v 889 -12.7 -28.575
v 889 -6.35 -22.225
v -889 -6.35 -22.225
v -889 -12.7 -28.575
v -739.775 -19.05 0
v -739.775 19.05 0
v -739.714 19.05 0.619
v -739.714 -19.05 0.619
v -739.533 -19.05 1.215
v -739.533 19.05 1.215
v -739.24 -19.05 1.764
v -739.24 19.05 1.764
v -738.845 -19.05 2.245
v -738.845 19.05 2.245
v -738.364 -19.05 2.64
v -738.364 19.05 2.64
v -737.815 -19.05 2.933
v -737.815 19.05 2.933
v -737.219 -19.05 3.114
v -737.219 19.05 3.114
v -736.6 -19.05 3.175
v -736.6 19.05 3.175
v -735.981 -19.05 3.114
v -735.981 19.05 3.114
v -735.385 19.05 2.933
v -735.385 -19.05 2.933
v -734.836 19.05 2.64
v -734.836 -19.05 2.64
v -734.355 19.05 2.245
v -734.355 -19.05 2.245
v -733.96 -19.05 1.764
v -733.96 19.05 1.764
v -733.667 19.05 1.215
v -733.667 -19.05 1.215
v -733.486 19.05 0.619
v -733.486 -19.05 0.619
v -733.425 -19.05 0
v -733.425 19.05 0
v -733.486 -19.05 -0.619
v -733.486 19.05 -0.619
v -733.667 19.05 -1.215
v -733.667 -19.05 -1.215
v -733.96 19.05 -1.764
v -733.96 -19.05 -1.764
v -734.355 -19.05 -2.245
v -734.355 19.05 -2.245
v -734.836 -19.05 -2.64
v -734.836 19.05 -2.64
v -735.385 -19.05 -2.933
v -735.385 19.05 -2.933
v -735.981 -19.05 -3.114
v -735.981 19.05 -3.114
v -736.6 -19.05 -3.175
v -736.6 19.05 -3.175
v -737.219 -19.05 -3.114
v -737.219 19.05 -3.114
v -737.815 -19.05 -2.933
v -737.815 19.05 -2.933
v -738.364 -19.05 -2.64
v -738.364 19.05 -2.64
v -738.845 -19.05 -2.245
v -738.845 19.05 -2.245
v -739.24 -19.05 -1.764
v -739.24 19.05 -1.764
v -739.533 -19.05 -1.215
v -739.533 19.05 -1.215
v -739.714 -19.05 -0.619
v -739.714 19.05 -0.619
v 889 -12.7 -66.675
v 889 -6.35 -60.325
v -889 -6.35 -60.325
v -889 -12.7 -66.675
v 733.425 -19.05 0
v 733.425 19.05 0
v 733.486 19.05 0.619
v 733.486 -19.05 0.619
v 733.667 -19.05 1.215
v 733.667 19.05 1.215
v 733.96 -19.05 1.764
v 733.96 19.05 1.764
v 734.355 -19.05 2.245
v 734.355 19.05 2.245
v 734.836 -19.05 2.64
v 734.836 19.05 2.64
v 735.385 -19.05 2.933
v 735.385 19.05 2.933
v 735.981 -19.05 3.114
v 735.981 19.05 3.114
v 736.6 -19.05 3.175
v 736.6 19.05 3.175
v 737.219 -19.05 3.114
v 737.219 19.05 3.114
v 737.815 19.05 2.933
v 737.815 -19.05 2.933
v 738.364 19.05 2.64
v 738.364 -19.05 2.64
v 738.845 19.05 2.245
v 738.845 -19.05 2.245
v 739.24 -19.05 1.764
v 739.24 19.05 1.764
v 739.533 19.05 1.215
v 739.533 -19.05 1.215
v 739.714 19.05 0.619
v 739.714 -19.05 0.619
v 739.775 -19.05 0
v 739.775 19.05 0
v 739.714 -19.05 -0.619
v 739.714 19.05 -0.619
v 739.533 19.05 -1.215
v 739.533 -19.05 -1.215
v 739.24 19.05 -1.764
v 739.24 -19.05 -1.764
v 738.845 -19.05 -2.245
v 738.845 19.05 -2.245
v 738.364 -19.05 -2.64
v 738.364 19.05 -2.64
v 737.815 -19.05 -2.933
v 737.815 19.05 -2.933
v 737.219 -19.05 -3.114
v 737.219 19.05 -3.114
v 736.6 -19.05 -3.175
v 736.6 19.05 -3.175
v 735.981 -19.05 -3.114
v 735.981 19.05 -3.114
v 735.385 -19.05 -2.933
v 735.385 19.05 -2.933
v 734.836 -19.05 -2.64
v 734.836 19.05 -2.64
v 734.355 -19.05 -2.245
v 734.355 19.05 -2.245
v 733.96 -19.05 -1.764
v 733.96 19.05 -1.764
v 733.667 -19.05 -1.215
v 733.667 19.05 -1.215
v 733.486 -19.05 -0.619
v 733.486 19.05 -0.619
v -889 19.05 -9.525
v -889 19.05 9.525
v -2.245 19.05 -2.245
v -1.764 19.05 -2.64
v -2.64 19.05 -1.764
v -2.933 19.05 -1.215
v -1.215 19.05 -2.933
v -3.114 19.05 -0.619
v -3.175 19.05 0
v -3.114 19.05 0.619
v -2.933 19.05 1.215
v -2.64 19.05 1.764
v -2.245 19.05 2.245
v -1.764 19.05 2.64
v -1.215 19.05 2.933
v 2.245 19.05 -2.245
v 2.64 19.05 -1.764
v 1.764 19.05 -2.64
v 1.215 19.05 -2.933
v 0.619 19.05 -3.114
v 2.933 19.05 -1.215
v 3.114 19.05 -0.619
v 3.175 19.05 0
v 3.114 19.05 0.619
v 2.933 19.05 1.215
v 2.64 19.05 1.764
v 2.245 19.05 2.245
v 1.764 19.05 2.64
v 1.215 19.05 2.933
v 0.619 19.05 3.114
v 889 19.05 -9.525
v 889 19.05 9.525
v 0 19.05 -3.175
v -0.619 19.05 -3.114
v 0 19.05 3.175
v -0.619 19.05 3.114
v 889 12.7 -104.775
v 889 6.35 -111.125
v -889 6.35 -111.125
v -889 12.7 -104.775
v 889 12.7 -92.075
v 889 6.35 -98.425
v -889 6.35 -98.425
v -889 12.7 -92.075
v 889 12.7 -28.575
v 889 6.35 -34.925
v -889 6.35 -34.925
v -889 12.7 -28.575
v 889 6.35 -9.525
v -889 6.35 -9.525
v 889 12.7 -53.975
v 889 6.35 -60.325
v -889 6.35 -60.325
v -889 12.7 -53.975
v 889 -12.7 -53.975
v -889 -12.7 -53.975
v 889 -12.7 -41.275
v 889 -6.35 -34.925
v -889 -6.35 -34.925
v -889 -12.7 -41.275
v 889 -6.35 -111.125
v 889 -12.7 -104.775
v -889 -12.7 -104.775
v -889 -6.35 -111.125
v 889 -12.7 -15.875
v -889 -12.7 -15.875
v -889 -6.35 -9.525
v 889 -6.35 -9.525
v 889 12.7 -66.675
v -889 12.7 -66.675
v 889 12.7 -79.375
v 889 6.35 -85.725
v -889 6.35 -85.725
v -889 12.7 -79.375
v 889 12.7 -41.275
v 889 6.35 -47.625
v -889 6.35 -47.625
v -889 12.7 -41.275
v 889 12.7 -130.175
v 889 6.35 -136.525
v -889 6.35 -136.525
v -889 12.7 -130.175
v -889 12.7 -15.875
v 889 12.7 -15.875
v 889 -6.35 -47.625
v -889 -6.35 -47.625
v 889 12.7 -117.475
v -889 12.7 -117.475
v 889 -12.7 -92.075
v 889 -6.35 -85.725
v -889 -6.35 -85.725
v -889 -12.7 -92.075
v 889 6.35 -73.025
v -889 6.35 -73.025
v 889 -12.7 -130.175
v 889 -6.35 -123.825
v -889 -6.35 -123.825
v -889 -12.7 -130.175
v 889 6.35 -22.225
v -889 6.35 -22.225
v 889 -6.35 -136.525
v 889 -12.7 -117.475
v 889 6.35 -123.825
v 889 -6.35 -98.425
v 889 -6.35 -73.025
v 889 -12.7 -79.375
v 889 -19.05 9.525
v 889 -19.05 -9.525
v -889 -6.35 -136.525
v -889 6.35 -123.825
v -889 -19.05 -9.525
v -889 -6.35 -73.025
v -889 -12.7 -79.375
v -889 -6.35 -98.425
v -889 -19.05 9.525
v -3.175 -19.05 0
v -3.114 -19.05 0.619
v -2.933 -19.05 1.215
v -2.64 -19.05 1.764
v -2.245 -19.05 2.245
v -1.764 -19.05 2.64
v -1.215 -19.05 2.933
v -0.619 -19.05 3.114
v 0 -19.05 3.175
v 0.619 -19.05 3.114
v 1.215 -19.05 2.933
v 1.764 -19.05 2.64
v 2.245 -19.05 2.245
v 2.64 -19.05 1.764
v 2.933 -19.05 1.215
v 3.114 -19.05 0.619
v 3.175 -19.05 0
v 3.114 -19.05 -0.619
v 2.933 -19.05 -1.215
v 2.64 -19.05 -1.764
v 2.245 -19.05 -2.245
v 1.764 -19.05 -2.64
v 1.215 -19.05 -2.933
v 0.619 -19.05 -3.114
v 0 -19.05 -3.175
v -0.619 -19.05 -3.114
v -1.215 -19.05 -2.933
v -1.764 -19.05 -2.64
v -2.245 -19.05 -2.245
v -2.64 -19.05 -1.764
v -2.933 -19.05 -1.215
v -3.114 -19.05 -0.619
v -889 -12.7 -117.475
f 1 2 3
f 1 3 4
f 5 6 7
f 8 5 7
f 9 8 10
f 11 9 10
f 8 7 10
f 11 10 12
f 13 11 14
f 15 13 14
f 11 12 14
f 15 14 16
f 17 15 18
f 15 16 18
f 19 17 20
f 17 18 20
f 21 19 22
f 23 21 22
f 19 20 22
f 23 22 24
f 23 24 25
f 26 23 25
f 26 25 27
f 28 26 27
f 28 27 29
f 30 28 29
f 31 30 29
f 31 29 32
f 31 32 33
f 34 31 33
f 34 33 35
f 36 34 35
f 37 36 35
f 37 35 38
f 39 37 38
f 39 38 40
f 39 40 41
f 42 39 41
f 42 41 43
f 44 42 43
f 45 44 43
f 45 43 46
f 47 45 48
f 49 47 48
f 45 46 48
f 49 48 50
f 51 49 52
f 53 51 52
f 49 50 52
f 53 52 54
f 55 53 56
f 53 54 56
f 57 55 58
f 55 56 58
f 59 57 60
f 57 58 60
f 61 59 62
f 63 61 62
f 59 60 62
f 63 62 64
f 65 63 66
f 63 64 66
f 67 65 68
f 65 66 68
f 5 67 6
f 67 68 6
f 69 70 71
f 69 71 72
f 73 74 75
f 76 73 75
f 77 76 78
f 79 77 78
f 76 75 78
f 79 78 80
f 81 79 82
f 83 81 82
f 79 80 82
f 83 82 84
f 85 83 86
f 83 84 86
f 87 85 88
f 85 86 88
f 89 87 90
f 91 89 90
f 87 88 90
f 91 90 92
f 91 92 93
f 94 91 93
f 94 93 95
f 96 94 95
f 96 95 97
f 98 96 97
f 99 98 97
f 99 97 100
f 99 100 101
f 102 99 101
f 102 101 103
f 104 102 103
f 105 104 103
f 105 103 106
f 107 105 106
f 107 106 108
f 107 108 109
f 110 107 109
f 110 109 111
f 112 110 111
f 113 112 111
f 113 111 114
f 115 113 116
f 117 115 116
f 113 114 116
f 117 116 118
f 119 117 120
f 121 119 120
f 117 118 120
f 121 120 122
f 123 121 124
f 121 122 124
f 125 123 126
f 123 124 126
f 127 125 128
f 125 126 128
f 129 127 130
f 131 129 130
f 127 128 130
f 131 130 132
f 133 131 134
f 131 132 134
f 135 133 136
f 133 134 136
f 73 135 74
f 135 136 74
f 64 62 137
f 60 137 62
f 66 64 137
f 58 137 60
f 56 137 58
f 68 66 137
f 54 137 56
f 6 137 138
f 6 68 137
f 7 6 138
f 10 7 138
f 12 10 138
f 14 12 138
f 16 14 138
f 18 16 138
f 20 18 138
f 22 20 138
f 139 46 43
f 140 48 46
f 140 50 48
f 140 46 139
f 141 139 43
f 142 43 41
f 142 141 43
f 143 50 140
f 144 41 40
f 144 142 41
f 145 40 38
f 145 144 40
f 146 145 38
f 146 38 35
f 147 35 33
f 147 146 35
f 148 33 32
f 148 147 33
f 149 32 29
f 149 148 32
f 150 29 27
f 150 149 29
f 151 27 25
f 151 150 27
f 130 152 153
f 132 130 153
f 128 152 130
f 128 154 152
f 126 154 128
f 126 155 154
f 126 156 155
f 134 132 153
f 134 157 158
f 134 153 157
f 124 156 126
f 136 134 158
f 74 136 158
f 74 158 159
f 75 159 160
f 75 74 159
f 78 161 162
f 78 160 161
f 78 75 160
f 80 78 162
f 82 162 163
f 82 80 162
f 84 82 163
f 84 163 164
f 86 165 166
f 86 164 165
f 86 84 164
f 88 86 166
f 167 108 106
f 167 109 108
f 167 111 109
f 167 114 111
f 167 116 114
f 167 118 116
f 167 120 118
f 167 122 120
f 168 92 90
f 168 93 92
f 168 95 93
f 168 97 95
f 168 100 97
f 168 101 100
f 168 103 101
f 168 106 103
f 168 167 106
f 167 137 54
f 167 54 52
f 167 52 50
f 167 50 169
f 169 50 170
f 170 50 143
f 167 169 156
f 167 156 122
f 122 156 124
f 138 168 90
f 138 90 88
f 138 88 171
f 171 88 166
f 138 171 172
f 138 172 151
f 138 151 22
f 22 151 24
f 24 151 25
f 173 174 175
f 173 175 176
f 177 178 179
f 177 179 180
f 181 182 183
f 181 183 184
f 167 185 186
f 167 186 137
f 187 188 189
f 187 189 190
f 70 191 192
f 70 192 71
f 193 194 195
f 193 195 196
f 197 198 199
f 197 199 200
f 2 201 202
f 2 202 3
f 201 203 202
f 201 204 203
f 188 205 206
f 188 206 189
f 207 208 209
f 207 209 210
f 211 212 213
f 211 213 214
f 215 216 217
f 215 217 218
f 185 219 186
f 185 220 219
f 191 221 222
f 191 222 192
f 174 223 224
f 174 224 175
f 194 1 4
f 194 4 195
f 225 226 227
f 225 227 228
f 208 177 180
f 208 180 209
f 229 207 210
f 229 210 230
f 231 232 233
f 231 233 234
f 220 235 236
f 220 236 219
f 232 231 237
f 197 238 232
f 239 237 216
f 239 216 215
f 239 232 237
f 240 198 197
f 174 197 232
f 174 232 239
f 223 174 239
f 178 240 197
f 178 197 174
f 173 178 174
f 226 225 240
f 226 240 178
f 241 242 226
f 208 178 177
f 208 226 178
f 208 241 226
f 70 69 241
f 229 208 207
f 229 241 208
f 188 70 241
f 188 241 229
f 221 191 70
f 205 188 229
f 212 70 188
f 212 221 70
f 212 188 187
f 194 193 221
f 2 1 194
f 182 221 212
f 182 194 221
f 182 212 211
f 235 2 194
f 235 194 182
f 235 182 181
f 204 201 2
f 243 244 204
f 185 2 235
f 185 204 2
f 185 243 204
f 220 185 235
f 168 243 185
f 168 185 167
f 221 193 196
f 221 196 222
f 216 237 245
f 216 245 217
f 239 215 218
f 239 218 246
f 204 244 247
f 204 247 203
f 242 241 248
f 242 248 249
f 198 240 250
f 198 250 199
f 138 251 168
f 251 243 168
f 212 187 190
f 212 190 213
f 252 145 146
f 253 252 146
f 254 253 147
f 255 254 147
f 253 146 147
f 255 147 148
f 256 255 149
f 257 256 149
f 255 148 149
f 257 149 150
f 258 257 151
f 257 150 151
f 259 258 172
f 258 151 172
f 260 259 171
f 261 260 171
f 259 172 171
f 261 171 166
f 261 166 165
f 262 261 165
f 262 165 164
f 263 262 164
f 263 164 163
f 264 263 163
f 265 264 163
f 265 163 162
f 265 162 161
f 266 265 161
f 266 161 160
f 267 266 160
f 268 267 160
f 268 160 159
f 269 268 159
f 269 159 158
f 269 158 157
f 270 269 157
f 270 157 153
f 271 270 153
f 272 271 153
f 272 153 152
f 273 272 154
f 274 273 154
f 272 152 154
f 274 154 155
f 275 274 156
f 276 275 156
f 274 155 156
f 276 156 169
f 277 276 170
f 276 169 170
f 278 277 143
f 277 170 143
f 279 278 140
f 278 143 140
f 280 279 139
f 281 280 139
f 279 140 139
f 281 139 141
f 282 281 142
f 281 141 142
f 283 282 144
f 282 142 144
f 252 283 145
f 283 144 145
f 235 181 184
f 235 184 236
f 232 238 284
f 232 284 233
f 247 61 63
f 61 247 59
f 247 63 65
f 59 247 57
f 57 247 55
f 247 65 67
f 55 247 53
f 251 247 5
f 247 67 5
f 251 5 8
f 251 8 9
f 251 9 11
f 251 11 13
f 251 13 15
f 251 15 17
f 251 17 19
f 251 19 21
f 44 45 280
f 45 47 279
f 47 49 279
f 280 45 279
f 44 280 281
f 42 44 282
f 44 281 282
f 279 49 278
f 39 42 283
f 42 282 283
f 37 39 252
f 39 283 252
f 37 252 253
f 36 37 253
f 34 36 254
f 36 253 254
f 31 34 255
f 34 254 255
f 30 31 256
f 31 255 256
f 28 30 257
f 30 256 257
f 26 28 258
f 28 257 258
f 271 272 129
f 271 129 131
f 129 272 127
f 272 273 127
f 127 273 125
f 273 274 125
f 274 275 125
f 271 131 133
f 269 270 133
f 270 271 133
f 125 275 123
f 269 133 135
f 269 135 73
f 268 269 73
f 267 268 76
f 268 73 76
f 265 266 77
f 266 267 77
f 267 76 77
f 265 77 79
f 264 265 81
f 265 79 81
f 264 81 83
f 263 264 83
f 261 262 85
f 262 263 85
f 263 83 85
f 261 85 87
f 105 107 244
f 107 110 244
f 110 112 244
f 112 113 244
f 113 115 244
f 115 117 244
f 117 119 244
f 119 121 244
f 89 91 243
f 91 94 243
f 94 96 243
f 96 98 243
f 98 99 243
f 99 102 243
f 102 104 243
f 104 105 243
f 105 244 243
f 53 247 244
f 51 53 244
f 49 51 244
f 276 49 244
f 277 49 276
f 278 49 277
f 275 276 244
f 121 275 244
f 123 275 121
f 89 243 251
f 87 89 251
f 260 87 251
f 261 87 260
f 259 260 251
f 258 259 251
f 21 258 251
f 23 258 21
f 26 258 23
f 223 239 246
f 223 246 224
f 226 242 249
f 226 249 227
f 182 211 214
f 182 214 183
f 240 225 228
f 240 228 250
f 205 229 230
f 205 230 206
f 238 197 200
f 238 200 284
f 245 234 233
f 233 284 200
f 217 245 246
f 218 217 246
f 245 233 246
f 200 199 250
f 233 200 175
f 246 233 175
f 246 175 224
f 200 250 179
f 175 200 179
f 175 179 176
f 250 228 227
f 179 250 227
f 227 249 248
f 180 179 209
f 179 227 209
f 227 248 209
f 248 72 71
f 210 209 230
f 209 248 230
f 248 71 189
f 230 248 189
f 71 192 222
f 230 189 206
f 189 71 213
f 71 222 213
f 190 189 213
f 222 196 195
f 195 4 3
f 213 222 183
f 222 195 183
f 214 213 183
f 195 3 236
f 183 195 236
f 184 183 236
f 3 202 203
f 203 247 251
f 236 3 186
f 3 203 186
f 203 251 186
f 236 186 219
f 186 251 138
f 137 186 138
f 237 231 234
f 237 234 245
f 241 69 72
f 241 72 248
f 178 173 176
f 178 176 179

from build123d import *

# Parameters (mm, degrees)
F0_W     = 38.1
F0_H     = 19.05
F1_DEPTH = 889
F3_DEPTH = 889
F5_D     = 6.35


with BuildPart() as f1:
    # F0 (on Right) → F1 (new body, symmetric)
    with BuildSketch(Plane.YZ):
        Rectangle(F0_W, F0_H)
    extrude(amount=F1_DEPTH, both=True)

    # F2 (on Right) → F3 (join, symmetric)
    with BuildSketch(Plane.YZ):
        Polygon((0, -9.525), (-6.35, -9.525), (-12.7, -15.875), (-6.35, -22.225), (0, -22.225), (6.35, -22.225), (12.7, -15.875), (6.35, -9.525), align=None)
        Polygon((0, -22.225), (-6.35, -22.225), (-12.7, -28.575), (-6.35, -34.925), (0, -34.925), (6.35, -34.925), (12.7, -28.575), (6.35, -22.225), align=None)
        Polygon((0, -34.925), (-6.35, -34.925), (-12.7, -41.275), (-6.35, -47.625), (0, -47.625), (6.35, -47.625), (12.7, -41.275), (6.35, -34.925), align=None)
        Polygon((0, -47.625), (-6.35, -47.625), (-12.7, -53.975), (-6.35, -60.325), (0, -60.325), (6.35, -60.325), (12.7, -53.975), (6.35, -47.625), align=None)
        Polygon((0, -60.325), (-6.35, -60.325), (-12.7, -66.675), (-6.35, -73.025), (0, -73.025), (6.35, -73.025), (12.7, -66.675), (6.35, -60.325), align=None)
        Polygon((0, -73.025), (-6.35, -73.025), (-12.7, -79.375), (-6.35, -85.725), (0, -85.725), (6.35, -85.725), (12.7, -79.375), (6.35, -73.025), align=None)
        Polygon((0, -85.725), (-6.35, -85.725), (-12.7, -92.075), (-6.35, -98.425), (0, -98.425), (6.35, -98.425), (12.7, -92.075), (6.35, -85.725), align=None)
        Polygon((0, -98.425), (-6.35, -98.425), (-12.7, -104.775), (-6.35, -111.125), (0, -111.125), (6.35, -111.125), (12.7, -104.775), (6.35, -98.425), align=None)
        Polygon((0, -111.125), (-6.35, -111.125), (-12.7, -117.475), (-6.35, -123.825), (0, -123.825), (6.35, -123.825), (12.7, -117.475), (6.35, -111.125), align=None)
        Polygon((0, -123.825), (-6.35, -123.825), (-12.7, -130.175), (-6.35, -136.525), (0, -136.525), (6.35, -136.525), (12.7, -130.175), (6.35, -123.825), align=None)
    extrude(amount=F3_DEPTH, both=True)

    # F5 (through all)
    with Locations(Plane.XZ.offset(19.05)):
        with Locations((0, 0), (736.6, 0), (-736.6, 0)):
            Hole(F5_D / 2)


solid = f1.part
